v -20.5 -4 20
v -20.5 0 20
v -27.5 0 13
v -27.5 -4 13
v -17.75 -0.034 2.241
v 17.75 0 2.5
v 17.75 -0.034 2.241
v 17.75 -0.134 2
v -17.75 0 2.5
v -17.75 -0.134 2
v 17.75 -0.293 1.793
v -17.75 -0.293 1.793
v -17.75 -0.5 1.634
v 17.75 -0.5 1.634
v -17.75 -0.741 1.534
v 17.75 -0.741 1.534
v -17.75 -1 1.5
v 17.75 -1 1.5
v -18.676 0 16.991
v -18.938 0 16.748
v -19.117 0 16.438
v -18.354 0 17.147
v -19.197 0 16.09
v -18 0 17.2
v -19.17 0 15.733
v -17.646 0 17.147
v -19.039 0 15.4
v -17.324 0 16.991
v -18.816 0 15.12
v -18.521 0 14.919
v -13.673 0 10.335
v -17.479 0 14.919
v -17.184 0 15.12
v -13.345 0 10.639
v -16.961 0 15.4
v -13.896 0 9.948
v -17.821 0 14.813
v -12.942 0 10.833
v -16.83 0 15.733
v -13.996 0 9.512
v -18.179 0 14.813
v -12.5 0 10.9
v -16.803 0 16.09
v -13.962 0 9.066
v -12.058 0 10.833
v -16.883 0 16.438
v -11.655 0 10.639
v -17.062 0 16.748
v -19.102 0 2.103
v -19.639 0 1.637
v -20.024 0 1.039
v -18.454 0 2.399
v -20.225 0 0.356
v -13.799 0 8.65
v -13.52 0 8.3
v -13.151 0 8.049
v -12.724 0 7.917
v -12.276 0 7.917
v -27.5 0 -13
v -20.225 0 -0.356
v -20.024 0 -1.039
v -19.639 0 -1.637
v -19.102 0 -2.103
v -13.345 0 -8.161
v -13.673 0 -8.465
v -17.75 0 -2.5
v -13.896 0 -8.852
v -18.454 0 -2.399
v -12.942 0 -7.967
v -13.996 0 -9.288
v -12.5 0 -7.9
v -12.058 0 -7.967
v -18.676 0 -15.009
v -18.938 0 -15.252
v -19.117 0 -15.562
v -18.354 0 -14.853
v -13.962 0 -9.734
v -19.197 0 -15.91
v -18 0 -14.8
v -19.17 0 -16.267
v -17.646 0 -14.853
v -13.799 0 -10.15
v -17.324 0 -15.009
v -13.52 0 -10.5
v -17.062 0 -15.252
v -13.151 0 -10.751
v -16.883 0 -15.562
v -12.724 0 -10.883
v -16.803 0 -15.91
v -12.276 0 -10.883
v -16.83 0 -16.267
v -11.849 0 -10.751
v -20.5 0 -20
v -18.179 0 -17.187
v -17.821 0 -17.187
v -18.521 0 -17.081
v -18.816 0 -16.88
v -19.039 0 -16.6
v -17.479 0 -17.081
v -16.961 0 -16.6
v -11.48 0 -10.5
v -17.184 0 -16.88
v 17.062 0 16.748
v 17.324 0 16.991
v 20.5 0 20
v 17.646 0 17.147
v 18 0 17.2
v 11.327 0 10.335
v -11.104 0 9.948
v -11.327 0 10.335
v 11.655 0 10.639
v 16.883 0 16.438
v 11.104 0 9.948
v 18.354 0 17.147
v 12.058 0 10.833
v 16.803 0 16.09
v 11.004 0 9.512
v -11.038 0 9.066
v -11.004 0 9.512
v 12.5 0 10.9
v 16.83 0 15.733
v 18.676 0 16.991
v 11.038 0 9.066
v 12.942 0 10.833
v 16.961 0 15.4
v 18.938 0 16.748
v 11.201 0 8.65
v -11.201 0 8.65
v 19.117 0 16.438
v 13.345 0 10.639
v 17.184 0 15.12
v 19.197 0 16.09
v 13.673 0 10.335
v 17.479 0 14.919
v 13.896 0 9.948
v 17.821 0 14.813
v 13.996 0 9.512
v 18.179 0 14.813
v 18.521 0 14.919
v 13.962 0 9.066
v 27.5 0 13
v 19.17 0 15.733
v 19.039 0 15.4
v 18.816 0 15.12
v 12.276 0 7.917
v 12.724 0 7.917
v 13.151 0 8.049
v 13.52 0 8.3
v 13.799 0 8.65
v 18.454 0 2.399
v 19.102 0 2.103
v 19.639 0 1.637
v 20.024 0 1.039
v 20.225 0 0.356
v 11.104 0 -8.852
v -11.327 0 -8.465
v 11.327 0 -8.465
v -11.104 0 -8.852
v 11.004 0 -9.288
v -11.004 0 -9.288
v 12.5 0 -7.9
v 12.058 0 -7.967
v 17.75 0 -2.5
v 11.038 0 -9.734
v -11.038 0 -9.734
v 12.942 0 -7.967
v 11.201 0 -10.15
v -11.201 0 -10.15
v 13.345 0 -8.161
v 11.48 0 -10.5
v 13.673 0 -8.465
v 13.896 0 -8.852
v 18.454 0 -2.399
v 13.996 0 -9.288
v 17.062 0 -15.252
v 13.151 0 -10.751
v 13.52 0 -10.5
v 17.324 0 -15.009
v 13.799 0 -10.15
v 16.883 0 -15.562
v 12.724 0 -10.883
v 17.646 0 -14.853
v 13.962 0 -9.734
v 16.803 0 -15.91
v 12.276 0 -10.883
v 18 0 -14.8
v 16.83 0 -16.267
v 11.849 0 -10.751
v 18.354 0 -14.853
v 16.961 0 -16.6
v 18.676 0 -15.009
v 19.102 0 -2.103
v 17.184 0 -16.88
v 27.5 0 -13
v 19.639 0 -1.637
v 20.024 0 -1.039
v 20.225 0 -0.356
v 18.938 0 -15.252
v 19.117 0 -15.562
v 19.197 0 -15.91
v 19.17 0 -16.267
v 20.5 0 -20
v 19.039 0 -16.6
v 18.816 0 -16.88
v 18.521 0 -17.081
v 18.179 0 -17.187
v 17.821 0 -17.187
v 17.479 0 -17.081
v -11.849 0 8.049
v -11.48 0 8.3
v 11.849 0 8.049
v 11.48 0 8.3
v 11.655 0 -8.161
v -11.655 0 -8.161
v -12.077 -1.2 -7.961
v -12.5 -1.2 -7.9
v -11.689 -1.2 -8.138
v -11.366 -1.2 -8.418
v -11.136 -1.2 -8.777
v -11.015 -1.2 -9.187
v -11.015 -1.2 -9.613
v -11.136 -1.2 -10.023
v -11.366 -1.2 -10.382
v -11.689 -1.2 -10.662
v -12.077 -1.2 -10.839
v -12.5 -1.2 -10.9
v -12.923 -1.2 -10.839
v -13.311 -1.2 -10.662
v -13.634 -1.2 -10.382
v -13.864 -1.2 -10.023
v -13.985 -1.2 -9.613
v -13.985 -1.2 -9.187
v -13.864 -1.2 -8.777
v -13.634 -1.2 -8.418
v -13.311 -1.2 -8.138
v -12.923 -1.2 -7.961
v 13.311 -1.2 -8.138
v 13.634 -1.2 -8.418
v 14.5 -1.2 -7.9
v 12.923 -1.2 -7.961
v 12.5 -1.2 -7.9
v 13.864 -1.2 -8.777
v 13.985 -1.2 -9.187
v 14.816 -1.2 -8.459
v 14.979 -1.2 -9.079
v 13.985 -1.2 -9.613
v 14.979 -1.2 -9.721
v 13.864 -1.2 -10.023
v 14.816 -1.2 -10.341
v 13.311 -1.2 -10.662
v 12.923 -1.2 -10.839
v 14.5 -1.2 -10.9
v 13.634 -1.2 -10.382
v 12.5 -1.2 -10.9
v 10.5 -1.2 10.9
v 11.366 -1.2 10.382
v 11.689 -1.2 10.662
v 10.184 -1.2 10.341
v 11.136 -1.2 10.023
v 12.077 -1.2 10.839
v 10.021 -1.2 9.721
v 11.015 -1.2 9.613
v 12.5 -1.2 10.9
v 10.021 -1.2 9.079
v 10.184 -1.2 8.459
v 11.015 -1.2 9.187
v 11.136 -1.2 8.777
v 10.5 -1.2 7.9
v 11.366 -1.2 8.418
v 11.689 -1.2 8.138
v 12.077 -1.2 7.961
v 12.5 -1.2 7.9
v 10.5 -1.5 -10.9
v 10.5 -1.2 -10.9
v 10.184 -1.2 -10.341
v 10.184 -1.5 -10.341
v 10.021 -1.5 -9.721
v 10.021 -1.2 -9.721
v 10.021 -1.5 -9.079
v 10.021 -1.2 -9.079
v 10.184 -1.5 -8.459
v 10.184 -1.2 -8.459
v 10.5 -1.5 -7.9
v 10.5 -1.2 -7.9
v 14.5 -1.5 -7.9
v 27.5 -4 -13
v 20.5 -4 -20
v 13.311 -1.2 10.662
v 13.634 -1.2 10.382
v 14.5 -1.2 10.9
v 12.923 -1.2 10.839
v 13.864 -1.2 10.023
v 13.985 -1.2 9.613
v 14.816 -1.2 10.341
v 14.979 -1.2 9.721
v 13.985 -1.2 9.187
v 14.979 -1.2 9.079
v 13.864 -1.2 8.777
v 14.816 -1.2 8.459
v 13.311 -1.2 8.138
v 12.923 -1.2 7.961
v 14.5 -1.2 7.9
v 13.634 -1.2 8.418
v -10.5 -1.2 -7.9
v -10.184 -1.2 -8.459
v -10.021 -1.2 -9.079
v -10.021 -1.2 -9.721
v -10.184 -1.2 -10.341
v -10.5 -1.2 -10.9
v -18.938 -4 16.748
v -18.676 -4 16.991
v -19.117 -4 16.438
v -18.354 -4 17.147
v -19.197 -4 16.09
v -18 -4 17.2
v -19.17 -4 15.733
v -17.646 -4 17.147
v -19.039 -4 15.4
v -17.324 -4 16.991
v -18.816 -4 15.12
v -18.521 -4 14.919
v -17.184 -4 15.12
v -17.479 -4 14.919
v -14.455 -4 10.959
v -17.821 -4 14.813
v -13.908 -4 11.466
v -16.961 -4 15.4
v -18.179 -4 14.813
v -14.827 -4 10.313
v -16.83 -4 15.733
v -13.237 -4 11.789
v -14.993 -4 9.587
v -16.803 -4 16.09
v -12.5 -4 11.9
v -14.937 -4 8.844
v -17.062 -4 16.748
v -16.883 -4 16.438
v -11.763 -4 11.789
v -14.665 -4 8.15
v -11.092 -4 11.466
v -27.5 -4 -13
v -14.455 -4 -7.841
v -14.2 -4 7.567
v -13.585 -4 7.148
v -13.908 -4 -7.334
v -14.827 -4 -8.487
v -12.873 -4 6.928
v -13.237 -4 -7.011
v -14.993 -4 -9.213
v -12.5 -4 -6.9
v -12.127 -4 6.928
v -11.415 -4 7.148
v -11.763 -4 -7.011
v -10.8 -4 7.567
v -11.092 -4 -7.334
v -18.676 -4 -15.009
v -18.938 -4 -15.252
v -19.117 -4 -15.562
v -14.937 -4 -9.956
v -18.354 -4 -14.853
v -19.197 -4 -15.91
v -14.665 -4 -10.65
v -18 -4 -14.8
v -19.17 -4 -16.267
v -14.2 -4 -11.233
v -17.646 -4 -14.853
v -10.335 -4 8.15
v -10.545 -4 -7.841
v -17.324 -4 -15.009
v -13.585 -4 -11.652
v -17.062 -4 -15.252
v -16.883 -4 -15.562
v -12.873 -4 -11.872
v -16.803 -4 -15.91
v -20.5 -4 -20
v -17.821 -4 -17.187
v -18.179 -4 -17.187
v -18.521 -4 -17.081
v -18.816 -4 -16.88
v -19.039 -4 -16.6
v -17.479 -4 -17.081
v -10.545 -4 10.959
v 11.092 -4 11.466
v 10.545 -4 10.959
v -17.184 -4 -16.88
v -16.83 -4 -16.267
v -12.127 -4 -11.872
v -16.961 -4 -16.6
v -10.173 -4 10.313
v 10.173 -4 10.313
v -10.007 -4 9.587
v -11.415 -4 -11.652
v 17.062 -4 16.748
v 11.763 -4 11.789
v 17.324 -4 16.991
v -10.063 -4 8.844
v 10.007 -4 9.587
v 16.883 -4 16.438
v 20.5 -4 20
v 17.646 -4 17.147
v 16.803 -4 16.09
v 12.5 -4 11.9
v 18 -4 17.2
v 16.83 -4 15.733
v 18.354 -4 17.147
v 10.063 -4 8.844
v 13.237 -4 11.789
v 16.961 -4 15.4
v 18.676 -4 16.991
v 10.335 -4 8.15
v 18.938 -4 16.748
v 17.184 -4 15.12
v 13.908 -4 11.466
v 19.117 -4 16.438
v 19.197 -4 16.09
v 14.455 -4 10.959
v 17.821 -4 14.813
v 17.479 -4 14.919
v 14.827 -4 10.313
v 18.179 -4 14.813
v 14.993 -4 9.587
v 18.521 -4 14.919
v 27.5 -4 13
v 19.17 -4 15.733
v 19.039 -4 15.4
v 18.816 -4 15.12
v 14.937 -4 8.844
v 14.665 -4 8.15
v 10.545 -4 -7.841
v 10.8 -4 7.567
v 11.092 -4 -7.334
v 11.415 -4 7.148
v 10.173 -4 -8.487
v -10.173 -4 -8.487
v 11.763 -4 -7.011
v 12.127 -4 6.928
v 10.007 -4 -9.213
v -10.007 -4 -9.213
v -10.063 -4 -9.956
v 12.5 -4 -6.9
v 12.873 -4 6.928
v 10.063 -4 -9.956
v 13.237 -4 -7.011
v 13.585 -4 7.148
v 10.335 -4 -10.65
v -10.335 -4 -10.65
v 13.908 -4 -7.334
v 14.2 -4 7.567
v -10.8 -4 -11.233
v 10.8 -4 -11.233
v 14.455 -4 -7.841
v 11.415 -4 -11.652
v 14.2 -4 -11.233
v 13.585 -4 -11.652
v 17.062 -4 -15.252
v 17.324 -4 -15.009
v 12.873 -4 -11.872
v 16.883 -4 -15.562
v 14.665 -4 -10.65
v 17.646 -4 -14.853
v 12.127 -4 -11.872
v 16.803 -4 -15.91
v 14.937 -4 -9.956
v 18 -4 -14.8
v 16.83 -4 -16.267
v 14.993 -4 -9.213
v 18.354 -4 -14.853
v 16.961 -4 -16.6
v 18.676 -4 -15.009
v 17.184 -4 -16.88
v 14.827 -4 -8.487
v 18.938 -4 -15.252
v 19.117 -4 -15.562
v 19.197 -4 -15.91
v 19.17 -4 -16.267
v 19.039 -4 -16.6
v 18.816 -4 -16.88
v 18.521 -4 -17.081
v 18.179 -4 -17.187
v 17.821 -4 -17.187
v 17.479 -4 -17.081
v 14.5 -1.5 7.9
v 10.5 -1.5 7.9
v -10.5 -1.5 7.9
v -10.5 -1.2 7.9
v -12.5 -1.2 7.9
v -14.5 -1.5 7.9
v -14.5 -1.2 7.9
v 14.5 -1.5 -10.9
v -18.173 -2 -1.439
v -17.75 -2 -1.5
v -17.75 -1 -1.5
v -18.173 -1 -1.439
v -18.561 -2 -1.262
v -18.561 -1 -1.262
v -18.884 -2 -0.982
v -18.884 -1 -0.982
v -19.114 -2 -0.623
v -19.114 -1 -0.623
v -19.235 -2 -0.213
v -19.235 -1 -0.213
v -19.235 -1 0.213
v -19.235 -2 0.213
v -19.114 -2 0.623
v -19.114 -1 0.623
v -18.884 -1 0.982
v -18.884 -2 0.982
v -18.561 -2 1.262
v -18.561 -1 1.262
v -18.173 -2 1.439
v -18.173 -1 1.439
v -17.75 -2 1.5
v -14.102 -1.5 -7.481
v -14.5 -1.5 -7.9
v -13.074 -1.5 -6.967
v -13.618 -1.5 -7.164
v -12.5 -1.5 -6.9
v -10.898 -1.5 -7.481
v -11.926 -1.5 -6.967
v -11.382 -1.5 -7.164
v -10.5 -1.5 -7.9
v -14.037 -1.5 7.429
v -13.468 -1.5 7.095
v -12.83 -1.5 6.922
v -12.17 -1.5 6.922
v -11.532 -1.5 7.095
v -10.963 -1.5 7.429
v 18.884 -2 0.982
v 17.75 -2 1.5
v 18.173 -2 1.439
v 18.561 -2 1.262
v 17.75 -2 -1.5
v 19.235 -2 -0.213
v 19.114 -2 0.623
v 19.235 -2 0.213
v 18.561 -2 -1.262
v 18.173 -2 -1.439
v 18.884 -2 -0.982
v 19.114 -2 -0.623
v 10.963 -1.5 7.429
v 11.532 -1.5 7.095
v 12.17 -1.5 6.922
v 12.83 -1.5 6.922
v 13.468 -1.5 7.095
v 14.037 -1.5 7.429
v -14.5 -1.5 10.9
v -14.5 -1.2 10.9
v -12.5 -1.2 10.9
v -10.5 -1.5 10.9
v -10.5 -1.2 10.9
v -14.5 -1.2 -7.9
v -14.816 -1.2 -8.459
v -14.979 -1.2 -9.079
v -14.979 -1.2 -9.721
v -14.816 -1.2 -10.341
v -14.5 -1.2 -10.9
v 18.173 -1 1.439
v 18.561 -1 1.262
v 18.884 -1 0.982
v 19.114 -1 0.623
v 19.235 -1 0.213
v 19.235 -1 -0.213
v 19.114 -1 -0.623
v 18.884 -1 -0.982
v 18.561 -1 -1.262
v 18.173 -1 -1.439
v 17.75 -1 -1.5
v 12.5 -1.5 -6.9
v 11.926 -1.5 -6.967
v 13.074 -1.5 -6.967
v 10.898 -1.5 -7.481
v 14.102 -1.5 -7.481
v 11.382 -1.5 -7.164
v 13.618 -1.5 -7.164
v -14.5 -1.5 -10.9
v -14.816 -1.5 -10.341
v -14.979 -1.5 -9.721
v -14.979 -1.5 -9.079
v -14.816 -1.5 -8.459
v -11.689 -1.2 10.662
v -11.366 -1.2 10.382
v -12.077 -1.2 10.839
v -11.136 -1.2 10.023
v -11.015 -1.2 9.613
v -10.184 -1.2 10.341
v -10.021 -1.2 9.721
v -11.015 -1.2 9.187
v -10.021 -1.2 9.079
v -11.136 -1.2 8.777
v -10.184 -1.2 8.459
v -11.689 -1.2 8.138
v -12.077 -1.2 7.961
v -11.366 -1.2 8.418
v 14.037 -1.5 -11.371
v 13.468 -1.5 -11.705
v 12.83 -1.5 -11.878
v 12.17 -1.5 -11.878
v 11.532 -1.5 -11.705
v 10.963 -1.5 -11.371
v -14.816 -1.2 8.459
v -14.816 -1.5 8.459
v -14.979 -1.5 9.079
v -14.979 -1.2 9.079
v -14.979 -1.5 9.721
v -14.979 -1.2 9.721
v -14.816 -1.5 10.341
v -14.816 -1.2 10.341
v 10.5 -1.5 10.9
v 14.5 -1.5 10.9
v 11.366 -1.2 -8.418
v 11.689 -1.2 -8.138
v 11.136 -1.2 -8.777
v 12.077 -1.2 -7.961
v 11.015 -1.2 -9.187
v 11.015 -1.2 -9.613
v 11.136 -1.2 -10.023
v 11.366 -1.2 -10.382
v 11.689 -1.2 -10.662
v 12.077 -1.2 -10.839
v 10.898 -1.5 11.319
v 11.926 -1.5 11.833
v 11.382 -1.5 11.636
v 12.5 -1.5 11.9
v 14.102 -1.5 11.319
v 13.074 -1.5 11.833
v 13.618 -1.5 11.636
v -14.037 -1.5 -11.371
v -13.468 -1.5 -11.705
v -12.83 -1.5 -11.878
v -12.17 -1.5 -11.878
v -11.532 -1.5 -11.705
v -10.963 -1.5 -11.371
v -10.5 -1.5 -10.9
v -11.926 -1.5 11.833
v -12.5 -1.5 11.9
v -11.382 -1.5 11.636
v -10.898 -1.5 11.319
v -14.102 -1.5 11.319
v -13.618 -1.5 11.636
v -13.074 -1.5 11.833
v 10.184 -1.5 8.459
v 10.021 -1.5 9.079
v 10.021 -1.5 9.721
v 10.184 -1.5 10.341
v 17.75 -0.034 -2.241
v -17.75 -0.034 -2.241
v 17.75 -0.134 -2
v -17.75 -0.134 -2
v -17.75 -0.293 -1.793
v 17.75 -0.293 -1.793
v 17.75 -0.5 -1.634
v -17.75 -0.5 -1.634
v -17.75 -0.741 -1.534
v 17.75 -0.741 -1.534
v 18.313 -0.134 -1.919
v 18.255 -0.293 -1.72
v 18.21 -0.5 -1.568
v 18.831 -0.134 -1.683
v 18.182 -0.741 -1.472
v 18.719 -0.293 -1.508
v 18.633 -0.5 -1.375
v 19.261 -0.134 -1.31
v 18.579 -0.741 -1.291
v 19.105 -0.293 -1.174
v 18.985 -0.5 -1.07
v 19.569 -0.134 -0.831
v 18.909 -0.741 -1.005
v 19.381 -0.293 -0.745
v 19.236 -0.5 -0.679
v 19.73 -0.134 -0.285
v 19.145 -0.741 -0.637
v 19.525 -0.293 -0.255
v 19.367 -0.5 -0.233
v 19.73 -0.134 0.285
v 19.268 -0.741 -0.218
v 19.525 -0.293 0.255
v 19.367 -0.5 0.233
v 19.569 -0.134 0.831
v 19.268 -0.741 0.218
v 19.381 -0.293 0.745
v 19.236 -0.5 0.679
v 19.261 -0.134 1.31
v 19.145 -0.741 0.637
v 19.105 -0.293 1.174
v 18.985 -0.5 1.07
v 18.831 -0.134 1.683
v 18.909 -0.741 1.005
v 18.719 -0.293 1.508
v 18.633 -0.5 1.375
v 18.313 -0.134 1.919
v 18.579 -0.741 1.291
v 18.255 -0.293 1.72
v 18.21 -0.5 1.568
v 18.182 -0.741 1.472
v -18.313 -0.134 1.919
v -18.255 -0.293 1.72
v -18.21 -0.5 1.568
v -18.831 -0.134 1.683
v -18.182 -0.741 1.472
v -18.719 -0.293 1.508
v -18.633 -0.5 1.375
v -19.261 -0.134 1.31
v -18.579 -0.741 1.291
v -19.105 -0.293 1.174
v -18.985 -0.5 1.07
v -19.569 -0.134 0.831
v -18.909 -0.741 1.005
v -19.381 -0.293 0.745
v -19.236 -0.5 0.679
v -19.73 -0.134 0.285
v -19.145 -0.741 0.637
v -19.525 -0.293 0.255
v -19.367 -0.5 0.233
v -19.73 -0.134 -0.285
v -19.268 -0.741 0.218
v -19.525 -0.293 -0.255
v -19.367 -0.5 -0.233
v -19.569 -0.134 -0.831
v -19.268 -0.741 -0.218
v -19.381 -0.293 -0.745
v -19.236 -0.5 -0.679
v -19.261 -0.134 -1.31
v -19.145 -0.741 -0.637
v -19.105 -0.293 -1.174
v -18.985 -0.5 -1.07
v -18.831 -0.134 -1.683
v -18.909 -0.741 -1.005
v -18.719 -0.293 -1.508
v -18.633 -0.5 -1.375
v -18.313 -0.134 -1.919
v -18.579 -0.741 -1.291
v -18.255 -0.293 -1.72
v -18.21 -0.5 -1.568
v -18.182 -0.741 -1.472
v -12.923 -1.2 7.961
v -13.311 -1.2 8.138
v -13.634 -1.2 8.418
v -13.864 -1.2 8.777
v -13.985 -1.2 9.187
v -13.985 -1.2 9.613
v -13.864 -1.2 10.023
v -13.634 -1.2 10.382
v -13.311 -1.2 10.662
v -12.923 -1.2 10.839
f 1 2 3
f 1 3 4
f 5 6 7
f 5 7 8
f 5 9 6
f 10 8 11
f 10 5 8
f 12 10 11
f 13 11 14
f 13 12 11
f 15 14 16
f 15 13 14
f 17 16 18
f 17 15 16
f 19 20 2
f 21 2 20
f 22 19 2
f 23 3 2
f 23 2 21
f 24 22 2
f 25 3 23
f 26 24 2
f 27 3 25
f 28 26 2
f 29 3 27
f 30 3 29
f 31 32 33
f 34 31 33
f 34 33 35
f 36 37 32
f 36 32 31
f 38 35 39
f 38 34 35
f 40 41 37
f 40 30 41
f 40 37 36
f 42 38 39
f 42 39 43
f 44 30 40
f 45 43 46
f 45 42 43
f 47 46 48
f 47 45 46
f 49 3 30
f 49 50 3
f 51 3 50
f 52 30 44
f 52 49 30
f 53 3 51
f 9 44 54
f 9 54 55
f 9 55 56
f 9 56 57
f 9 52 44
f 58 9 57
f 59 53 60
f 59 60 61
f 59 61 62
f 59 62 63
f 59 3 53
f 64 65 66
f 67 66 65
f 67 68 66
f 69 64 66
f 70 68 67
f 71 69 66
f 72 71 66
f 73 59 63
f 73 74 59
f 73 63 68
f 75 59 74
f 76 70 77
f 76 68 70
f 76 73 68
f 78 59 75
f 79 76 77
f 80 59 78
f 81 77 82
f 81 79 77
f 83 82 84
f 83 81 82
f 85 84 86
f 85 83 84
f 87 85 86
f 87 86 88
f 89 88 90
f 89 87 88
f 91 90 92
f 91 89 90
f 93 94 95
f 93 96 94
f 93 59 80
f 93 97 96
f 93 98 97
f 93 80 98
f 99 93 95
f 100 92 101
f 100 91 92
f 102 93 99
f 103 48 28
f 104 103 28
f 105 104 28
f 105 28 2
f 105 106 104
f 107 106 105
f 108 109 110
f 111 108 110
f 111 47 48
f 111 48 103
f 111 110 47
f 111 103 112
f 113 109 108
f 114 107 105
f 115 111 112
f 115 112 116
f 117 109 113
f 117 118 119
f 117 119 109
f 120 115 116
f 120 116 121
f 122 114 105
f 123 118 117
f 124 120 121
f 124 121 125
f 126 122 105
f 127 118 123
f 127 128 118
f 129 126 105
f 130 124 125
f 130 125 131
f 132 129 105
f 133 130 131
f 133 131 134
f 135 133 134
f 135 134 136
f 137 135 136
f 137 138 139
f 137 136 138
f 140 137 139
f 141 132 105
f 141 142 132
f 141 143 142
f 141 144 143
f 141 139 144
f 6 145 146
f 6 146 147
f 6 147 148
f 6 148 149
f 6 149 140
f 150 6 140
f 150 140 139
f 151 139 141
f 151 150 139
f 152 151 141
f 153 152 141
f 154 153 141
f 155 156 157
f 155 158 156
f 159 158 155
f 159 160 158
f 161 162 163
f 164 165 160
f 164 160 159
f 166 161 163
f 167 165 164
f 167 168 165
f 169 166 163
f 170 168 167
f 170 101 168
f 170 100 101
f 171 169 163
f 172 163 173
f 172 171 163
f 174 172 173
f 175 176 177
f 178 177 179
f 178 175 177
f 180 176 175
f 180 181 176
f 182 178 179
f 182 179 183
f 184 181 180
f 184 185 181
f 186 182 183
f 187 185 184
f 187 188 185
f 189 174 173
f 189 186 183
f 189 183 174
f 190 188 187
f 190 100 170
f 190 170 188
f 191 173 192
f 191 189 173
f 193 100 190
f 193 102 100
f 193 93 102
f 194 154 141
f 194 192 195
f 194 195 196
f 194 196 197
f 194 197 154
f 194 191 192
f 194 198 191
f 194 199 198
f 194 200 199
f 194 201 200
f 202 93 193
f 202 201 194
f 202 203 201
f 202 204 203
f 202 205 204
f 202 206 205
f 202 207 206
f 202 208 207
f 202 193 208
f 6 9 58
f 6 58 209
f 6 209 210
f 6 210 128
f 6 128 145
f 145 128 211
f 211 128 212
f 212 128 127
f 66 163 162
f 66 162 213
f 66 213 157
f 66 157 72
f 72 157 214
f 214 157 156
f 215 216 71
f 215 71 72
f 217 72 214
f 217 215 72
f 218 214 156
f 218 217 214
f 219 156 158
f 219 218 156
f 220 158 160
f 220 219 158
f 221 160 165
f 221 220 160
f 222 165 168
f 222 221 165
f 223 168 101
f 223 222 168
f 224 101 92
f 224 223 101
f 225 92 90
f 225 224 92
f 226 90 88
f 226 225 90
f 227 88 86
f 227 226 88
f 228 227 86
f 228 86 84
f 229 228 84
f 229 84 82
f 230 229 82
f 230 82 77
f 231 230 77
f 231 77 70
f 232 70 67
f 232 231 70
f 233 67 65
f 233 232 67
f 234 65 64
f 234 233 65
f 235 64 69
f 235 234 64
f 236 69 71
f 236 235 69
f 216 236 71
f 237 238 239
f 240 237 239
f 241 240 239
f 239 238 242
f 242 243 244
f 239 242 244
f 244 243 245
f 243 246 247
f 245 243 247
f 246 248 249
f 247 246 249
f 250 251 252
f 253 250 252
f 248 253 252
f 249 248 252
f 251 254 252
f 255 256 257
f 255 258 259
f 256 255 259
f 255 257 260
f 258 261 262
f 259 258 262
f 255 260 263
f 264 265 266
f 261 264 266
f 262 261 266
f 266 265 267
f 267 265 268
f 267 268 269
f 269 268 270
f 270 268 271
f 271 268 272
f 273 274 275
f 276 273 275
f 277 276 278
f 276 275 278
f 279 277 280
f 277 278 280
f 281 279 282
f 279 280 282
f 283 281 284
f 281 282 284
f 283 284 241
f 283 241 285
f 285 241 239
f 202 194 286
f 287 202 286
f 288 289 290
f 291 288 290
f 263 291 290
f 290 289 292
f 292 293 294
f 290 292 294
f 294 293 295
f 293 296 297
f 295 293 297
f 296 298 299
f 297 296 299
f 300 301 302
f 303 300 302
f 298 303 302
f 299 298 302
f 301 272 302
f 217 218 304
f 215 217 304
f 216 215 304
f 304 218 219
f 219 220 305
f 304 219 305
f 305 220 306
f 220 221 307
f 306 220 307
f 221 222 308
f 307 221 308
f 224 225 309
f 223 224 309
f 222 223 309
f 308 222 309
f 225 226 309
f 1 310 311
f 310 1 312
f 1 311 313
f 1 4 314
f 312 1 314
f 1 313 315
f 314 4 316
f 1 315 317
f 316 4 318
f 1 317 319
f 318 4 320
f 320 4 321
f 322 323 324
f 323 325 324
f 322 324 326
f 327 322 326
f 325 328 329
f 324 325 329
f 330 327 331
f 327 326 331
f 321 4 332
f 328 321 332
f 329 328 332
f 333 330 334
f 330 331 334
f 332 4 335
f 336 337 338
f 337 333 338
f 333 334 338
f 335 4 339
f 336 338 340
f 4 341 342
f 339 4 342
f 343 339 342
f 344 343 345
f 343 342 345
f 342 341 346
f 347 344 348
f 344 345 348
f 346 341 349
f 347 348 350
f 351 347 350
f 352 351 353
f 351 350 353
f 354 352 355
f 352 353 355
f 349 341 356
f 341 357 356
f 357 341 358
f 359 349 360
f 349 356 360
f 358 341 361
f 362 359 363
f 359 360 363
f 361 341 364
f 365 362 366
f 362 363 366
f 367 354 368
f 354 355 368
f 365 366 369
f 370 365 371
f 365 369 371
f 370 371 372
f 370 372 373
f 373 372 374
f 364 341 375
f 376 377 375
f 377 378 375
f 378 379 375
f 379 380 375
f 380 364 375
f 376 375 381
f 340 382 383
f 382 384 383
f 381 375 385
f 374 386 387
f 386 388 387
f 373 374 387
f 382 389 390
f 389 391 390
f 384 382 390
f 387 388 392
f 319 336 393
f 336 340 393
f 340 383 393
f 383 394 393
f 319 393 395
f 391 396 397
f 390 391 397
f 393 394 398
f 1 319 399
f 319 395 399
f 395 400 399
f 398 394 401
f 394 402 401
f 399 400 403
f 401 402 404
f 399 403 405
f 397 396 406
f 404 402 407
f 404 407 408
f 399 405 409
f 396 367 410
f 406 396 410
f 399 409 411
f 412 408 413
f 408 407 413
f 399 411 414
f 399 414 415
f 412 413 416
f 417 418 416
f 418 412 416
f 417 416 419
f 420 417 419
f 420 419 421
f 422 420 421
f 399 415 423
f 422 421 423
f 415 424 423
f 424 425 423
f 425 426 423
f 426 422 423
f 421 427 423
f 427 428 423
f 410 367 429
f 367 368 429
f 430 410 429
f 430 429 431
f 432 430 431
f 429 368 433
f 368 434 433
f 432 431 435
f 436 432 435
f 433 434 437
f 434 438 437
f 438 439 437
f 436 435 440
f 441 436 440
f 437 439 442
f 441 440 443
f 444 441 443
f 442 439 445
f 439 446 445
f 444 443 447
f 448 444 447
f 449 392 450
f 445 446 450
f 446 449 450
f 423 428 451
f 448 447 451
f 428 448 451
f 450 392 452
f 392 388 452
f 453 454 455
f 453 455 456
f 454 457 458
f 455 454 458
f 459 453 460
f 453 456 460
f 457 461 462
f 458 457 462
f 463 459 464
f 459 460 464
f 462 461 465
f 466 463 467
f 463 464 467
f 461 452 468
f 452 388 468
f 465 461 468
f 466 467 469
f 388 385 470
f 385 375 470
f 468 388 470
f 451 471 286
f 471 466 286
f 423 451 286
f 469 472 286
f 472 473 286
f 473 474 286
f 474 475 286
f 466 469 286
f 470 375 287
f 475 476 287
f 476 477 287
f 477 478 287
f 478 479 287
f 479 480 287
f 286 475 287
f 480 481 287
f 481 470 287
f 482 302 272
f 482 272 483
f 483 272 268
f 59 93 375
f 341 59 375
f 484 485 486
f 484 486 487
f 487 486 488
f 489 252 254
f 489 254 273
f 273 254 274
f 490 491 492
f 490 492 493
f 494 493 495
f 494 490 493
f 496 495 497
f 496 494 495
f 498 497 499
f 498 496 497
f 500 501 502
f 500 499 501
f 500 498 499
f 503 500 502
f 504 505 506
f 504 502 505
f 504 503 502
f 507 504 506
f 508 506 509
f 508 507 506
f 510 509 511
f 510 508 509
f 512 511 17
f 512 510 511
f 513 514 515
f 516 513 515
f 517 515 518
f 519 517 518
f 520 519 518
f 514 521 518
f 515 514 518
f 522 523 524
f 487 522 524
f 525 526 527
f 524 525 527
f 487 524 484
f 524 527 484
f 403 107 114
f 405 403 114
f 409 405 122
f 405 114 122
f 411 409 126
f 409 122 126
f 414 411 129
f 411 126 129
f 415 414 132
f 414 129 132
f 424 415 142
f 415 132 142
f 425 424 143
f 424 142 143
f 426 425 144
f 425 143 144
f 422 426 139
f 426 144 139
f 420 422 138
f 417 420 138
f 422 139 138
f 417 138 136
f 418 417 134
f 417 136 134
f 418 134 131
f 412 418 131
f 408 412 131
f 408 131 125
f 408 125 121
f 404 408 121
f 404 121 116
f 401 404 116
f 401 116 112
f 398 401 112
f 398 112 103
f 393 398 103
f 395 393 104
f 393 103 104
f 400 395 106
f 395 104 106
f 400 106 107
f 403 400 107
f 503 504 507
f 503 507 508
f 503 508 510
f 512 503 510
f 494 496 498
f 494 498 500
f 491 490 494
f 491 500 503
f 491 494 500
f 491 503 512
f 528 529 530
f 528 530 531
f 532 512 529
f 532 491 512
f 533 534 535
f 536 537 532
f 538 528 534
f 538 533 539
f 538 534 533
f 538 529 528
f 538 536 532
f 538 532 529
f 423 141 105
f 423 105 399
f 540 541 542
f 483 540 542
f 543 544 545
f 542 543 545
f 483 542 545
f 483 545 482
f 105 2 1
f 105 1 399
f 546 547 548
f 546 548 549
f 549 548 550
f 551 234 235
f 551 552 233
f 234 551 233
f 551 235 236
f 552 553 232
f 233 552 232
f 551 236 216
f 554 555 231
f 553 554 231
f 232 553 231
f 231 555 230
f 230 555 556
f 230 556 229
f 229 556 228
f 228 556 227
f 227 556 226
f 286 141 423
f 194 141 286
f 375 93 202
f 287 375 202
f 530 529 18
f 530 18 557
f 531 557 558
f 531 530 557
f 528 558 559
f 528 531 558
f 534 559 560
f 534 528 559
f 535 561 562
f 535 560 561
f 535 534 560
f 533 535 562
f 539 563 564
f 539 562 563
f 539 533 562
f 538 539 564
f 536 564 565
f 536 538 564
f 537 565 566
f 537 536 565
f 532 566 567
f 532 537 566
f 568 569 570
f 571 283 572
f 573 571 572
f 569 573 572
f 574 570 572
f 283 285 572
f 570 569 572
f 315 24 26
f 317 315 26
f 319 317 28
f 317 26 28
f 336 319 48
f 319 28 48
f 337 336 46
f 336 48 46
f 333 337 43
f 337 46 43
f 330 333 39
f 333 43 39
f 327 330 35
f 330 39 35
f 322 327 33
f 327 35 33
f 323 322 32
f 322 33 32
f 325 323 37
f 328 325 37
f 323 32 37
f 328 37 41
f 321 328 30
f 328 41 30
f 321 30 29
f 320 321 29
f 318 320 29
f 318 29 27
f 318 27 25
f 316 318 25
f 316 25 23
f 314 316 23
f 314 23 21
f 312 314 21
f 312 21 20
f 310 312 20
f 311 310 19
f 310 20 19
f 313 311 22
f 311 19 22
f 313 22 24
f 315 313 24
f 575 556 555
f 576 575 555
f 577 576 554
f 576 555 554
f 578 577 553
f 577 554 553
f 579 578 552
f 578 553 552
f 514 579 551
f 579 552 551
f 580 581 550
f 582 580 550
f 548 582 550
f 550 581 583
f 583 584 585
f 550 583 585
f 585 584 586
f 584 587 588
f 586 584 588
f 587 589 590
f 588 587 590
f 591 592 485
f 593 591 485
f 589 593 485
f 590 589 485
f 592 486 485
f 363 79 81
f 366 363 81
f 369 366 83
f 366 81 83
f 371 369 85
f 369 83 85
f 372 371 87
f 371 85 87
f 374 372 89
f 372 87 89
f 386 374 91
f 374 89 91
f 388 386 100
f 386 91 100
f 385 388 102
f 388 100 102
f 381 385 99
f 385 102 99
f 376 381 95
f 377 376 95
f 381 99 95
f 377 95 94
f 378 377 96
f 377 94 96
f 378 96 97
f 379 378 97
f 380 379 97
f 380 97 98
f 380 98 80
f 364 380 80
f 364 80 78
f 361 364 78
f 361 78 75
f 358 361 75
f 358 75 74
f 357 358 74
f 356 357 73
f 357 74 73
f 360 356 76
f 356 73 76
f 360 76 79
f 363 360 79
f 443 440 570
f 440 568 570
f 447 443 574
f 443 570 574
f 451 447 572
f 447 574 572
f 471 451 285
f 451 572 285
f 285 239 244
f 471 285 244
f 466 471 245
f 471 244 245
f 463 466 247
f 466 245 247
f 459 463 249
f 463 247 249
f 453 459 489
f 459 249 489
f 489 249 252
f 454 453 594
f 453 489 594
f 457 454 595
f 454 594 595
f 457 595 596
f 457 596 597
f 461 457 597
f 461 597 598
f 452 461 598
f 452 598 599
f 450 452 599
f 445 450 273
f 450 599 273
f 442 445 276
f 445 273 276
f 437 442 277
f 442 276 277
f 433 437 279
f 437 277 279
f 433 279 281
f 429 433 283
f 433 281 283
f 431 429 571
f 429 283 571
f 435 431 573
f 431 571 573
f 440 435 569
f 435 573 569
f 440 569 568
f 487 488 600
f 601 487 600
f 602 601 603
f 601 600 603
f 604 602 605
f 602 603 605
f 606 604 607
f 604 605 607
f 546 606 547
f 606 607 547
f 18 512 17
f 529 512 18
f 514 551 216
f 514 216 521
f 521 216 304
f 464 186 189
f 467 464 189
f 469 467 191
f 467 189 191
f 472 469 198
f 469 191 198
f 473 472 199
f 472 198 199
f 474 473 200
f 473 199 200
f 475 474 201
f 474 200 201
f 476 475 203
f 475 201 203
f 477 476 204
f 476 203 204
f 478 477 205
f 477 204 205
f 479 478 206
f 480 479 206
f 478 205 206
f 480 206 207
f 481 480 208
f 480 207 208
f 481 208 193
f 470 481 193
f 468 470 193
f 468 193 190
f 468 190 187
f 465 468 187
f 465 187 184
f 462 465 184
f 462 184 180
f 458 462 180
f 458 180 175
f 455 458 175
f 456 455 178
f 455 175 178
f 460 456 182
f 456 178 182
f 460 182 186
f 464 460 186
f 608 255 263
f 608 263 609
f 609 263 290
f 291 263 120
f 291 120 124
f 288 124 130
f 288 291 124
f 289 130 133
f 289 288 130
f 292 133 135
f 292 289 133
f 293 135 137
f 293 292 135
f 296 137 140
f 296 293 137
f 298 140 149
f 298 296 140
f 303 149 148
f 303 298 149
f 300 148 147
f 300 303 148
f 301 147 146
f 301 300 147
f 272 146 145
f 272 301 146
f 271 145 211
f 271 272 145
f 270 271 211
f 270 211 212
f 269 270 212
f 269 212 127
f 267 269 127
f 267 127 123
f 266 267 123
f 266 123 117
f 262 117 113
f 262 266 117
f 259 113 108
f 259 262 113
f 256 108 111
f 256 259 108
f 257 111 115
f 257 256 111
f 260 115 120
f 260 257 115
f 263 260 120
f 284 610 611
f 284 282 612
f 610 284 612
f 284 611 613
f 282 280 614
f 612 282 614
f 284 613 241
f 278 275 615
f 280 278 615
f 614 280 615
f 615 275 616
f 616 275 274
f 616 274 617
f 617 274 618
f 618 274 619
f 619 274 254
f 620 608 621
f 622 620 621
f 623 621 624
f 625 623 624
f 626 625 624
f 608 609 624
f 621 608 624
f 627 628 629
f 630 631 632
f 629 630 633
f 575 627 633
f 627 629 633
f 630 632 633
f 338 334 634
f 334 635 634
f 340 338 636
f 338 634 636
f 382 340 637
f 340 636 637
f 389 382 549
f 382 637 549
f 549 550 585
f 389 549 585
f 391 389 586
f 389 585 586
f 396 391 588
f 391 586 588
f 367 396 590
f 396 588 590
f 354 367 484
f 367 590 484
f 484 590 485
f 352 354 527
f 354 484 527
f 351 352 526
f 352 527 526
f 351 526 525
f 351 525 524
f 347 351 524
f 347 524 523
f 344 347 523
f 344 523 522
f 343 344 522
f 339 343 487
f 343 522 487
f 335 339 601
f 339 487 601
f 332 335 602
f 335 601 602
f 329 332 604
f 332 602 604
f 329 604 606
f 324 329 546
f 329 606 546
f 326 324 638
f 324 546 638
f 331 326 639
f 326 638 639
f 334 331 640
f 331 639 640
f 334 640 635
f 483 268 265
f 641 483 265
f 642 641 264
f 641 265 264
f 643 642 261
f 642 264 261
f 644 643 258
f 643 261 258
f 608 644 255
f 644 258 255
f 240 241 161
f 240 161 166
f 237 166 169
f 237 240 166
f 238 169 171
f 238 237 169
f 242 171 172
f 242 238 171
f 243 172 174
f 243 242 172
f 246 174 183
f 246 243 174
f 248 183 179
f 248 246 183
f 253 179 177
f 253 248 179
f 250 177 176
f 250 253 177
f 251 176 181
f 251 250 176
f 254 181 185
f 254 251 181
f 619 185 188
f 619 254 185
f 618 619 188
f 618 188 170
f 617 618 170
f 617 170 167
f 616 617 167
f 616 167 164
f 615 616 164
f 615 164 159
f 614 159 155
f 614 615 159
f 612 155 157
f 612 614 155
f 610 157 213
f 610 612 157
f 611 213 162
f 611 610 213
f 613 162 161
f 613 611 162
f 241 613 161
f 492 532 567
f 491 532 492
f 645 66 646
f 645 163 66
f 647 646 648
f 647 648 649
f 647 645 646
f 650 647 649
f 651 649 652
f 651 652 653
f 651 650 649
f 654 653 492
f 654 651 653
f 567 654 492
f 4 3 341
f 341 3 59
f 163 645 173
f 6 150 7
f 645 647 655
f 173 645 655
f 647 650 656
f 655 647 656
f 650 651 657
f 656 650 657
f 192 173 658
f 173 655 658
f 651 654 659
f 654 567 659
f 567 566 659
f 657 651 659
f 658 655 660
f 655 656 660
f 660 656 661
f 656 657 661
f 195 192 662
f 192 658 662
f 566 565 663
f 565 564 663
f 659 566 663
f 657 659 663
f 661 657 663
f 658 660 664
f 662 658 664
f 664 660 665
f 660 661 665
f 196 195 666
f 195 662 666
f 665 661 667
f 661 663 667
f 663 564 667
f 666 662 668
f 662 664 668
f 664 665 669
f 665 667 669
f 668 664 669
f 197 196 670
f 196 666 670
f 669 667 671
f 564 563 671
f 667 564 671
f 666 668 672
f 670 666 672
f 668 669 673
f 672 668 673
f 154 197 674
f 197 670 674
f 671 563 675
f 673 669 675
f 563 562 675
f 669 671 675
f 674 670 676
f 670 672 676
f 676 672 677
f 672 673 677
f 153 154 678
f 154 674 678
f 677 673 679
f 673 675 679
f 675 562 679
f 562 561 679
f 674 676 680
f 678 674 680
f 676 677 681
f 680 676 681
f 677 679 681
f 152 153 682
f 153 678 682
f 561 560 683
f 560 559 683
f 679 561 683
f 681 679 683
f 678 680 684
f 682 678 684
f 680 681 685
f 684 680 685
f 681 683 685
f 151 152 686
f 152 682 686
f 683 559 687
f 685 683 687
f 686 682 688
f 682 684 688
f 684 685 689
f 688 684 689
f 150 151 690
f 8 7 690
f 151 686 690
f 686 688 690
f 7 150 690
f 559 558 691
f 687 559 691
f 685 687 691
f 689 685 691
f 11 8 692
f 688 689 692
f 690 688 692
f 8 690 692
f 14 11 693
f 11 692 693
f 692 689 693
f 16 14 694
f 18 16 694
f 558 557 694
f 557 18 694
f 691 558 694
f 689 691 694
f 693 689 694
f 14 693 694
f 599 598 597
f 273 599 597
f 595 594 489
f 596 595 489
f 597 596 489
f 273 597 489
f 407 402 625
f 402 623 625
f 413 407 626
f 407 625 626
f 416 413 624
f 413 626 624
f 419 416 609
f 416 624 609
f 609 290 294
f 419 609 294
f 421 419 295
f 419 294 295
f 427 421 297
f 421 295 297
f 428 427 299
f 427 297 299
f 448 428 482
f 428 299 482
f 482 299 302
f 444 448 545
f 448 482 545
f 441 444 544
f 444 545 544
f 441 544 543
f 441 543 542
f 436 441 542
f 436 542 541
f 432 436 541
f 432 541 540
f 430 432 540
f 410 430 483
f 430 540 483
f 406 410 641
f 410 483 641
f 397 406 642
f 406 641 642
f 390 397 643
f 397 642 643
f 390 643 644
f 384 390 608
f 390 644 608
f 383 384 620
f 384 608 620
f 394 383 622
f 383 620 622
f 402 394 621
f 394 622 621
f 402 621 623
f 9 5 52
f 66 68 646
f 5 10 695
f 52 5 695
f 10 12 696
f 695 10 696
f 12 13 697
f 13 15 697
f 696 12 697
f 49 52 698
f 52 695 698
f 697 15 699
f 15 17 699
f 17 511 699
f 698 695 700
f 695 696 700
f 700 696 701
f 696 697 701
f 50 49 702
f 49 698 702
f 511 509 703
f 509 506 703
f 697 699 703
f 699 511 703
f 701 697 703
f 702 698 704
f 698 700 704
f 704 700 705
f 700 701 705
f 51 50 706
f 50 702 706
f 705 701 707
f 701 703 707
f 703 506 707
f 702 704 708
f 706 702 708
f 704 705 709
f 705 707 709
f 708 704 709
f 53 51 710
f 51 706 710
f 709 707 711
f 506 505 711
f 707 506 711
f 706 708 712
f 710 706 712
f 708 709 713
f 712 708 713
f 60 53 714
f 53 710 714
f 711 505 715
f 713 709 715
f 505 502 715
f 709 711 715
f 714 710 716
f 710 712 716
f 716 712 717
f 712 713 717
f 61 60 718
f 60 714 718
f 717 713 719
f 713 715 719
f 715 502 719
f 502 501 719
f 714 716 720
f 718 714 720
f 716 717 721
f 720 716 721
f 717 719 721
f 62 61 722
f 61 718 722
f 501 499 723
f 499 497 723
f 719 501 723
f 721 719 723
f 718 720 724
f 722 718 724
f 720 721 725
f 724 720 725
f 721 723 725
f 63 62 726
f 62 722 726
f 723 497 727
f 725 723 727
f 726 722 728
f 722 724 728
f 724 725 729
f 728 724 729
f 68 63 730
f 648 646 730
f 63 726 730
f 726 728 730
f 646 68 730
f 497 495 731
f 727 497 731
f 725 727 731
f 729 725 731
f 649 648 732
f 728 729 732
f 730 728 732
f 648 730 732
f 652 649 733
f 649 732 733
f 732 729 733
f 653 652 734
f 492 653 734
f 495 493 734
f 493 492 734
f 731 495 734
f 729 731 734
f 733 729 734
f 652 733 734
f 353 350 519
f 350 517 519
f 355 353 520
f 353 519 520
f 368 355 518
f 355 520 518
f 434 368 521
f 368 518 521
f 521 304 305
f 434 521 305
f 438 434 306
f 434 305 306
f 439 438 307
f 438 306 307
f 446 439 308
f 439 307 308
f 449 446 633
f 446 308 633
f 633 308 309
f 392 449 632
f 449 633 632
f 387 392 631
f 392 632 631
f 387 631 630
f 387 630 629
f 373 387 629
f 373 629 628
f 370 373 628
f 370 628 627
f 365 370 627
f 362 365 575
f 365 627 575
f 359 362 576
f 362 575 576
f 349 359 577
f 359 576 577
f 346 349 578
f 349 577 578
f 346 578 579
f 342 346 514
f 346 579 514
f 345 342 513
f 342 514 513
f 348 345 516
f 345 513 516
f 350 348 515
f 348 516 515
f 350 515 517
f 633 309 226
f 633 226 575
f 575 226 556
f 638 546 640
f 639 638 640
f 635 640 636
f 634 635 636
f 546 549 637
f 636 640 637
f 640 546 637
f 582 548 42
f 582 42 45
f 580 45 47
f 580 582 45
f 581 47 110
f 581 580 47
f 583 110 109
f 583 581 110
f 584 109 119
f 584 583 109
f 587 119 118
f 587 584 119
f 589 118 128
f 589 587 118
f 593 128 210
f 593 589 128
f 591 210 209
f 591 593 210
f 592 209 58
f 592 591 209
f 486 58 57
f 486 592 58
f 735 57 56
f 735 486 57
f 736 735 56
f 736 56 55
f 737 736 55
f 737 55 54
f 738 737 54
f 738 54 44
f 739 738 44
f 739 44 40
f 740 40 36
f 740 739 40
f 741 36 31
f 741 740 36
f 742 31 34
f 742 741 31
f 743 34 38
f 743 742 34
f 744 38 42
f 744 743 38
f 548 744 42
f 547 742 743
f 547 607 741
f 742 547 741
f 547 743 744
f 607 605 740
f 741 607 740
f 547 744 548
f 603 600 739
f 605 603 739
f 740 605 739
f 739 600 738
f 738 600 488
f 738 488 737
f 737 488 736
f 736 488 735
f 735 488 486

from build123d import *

# Parameters (mm, degrees)
SKETCH2_W           = 55
SKETCH2_H           = 40
SKETCH2_R           = 1.2
BOSS_EXTRUDE1_DEPTH = 4
CHAMFER1_SIZE       = 7
SKETCH3_R           = 1.5
CUT_EXTRUDE1_DEPTH  = 35.062442661
FILLET1_R           = 1
CUT_EXTRUDE2_START  = 0.5
SKETCH4_R           = 2.5
CUT_EXTRUDE2_DEPTH  = 35.562442661
CUT_EXTRUDE6_START  = 0.3
CUT_EXTRUDE6_DEPTH  = 0.3


with BuildPart() as part:
    # Sketch2 → Boss-Extrude1 (new body)
    with BuildSketch(Plane(origin=(0, 0, 0), x_dir=(1, 0, 0), z_dir=(0, 1, 0))):
        Rectangle(SKETCH2_W, SKETCH2_H)
        with Locations(Location((-18, -16, 0), (0, 0, 270))):
            Circle(SKETCH2_R, mode=Mode.SUBTRACT)
        with Locations(Location((18, -16, 0), (0, 0, 270))):
            Circle(SKETCH2_R, mode=Mode.SUBTRACT)
        with Locations(Location((-18, 16, 0), (0, 0, 270))):
            Circle(SKETCH2_R, mode=Mode.SUBTRACT)
        with Locations(Location((18, 16, 0), (0, 0, 270))):
            Circle(SKETCH2_R, mode=Mode.SUBTRACT)
    extrude(amount=-BOSS_EXTRUDE1_DEPTH)

    # Chamfer1
    chamfer1_edges = [part.edges().sort_by_distance(p)[0] for p in [
        (27.5, -2, 20),
        (-27.5, -2, 20),
        (-27.5, -2, -20),
        (27.5, -2, -20),
    ]]
    chamfer(chamfer1_edges, length=CHAMFER1_SIZE)

    # Sketch3 → Cut-Extrude1 (cut, through all)
    with BuildSketch(Plane(origin=(0, -2, 0), x_dir=(1, 0, 0), z_dir=(0, 1, 0))):
        with Locations(Location((12.5, 9.4, 0), (0, 0, 270))):
            Circle(SKETCH3_R)
        with Locations(Location((-12.5, 9.4, 0), (0, 0, 270))):
            Circle(SKETCH3_R)
        with Locations(Location((-12.5, -9.4, 0), (0, 0, 270))):
            Circle(SKETCH3_R)
        with Locations(Location((12.5, -9.4, 0), (0, 0, 270))):
            Circle(SKETCH3_R)
        with BuildLine():
            Line((17.75, 1.5), (-17.75, 1.5))
            ThreePointArc((-17.75, 1.5), (-19.25, 0), (-17.75, -1.5))
            Line((-17.75, -1.5), (17.75, -1.5))
            ThreePointArc((17.75, -1.5), (19.25, 0), (17.75, 1.5))
        make_face()
    extrude(amount=CUT_EXTRUDE1_DEPTH, mode=Mode.SUBTRACT)

    # Fillet1
    fillet1_edges = [part.edges().sort_by_distance(p)[0] for p in [
        (19.25, 0, 0),
        (0, 0, -1.5),
        (-19.25, 0, 0),
        (0, 0, 1.5),
    ]]
    fillet(fillet1_edges, radius=FILLET1_R)

    # Sketch4 → Cut-Extrude2 (cut, through all)
    with BuildSketch(Plane(origin=(0, -2, 0), x_dir=(1, 0, 0), z_dir=(0, 1, 0)).offset(CUT_EXTRUDE2_START)):
        with Locations(Location((-12.5, 9.4, 0), (0, 0, 270))):
            Circle(SKETCH4_R)
        with Locations(Location((12.5, 9.4, 0), (0, 0, 270))):
            Circle(SKETCH4_R)
        with Locations(Location((-12.5, -9.4, 0), (0, 0, 270))):
            Circle(SKETCH4_R)
        with Locations(Location((12.5, -9.4, 0), (0, 0, 270))):
            Circle(SKETCH4_R)
    extrude(amount=-CUT_EXTRUDE2_DEPTH, mode=Mode.SUBTRACT)

    # Sketch5 → Cut-Extrude6 (cut)
    with BuildSketch(Plane(origin=(0, -1.5, 0), x_dir=(1, 0, 0), z_dir=(0, 1, 0)).offset(CUT_EXTRUDE6_START)):
        with BuildLine():
            Line((-14.5, -10.9), (-10.5, -10.9))
            ThreePointArc((-10.5, -10.9), (-10, -9.4), (-10.5, -7.9))
            Line((-10.5, -7.9), (-14.5, -7.9))
            ThreePointArc((-14.5, -7.9), (-15, -9.4), (-14.5, -10.9))
        make_face()
        with BuildLine():
            Line((-14.5, 7.9), (-10.5, 7.9))
            ThreePointArc((-10.5, 7.9), (-10, 9.4), (-10.5, 10.9))
            Line((-10.5, 10.9), (-14.5, 10.9))
            ThreePointArc((-14.5, 10.9), (-15, 9.4), (-14.5, 7.9))
        make_face()
        with BuildLine():
            Line((10.5, -10.9), (14.5, -10.9))
            ThreePointArc((14.5, -10.9), (15, -9.4), (14.5, -7.9))
            Line((14.5, -7.9), (10.5, -7.9))
            ThreePointArc((10.5, -7.9), (10, -9.4), (10.5, -10.9))
        make_face()
        with BuildLine():
            Line((10.5, 7.9), (14.5, 7.9))
            ThreePointArc((14.5, 7.9), (15, 9.4), (14.5, 10.9))
            Line((14.5, 10.9), (10.5, 10.9))
            ThreePointArc((10.5, 10.9), (10, 9.4), (10.5, 7.9))
        make_face()
    extrude(amount=-CUT_EXTRUDE6_DEPTH, mode=Mode.SUBTRACT)


solid = part.part
